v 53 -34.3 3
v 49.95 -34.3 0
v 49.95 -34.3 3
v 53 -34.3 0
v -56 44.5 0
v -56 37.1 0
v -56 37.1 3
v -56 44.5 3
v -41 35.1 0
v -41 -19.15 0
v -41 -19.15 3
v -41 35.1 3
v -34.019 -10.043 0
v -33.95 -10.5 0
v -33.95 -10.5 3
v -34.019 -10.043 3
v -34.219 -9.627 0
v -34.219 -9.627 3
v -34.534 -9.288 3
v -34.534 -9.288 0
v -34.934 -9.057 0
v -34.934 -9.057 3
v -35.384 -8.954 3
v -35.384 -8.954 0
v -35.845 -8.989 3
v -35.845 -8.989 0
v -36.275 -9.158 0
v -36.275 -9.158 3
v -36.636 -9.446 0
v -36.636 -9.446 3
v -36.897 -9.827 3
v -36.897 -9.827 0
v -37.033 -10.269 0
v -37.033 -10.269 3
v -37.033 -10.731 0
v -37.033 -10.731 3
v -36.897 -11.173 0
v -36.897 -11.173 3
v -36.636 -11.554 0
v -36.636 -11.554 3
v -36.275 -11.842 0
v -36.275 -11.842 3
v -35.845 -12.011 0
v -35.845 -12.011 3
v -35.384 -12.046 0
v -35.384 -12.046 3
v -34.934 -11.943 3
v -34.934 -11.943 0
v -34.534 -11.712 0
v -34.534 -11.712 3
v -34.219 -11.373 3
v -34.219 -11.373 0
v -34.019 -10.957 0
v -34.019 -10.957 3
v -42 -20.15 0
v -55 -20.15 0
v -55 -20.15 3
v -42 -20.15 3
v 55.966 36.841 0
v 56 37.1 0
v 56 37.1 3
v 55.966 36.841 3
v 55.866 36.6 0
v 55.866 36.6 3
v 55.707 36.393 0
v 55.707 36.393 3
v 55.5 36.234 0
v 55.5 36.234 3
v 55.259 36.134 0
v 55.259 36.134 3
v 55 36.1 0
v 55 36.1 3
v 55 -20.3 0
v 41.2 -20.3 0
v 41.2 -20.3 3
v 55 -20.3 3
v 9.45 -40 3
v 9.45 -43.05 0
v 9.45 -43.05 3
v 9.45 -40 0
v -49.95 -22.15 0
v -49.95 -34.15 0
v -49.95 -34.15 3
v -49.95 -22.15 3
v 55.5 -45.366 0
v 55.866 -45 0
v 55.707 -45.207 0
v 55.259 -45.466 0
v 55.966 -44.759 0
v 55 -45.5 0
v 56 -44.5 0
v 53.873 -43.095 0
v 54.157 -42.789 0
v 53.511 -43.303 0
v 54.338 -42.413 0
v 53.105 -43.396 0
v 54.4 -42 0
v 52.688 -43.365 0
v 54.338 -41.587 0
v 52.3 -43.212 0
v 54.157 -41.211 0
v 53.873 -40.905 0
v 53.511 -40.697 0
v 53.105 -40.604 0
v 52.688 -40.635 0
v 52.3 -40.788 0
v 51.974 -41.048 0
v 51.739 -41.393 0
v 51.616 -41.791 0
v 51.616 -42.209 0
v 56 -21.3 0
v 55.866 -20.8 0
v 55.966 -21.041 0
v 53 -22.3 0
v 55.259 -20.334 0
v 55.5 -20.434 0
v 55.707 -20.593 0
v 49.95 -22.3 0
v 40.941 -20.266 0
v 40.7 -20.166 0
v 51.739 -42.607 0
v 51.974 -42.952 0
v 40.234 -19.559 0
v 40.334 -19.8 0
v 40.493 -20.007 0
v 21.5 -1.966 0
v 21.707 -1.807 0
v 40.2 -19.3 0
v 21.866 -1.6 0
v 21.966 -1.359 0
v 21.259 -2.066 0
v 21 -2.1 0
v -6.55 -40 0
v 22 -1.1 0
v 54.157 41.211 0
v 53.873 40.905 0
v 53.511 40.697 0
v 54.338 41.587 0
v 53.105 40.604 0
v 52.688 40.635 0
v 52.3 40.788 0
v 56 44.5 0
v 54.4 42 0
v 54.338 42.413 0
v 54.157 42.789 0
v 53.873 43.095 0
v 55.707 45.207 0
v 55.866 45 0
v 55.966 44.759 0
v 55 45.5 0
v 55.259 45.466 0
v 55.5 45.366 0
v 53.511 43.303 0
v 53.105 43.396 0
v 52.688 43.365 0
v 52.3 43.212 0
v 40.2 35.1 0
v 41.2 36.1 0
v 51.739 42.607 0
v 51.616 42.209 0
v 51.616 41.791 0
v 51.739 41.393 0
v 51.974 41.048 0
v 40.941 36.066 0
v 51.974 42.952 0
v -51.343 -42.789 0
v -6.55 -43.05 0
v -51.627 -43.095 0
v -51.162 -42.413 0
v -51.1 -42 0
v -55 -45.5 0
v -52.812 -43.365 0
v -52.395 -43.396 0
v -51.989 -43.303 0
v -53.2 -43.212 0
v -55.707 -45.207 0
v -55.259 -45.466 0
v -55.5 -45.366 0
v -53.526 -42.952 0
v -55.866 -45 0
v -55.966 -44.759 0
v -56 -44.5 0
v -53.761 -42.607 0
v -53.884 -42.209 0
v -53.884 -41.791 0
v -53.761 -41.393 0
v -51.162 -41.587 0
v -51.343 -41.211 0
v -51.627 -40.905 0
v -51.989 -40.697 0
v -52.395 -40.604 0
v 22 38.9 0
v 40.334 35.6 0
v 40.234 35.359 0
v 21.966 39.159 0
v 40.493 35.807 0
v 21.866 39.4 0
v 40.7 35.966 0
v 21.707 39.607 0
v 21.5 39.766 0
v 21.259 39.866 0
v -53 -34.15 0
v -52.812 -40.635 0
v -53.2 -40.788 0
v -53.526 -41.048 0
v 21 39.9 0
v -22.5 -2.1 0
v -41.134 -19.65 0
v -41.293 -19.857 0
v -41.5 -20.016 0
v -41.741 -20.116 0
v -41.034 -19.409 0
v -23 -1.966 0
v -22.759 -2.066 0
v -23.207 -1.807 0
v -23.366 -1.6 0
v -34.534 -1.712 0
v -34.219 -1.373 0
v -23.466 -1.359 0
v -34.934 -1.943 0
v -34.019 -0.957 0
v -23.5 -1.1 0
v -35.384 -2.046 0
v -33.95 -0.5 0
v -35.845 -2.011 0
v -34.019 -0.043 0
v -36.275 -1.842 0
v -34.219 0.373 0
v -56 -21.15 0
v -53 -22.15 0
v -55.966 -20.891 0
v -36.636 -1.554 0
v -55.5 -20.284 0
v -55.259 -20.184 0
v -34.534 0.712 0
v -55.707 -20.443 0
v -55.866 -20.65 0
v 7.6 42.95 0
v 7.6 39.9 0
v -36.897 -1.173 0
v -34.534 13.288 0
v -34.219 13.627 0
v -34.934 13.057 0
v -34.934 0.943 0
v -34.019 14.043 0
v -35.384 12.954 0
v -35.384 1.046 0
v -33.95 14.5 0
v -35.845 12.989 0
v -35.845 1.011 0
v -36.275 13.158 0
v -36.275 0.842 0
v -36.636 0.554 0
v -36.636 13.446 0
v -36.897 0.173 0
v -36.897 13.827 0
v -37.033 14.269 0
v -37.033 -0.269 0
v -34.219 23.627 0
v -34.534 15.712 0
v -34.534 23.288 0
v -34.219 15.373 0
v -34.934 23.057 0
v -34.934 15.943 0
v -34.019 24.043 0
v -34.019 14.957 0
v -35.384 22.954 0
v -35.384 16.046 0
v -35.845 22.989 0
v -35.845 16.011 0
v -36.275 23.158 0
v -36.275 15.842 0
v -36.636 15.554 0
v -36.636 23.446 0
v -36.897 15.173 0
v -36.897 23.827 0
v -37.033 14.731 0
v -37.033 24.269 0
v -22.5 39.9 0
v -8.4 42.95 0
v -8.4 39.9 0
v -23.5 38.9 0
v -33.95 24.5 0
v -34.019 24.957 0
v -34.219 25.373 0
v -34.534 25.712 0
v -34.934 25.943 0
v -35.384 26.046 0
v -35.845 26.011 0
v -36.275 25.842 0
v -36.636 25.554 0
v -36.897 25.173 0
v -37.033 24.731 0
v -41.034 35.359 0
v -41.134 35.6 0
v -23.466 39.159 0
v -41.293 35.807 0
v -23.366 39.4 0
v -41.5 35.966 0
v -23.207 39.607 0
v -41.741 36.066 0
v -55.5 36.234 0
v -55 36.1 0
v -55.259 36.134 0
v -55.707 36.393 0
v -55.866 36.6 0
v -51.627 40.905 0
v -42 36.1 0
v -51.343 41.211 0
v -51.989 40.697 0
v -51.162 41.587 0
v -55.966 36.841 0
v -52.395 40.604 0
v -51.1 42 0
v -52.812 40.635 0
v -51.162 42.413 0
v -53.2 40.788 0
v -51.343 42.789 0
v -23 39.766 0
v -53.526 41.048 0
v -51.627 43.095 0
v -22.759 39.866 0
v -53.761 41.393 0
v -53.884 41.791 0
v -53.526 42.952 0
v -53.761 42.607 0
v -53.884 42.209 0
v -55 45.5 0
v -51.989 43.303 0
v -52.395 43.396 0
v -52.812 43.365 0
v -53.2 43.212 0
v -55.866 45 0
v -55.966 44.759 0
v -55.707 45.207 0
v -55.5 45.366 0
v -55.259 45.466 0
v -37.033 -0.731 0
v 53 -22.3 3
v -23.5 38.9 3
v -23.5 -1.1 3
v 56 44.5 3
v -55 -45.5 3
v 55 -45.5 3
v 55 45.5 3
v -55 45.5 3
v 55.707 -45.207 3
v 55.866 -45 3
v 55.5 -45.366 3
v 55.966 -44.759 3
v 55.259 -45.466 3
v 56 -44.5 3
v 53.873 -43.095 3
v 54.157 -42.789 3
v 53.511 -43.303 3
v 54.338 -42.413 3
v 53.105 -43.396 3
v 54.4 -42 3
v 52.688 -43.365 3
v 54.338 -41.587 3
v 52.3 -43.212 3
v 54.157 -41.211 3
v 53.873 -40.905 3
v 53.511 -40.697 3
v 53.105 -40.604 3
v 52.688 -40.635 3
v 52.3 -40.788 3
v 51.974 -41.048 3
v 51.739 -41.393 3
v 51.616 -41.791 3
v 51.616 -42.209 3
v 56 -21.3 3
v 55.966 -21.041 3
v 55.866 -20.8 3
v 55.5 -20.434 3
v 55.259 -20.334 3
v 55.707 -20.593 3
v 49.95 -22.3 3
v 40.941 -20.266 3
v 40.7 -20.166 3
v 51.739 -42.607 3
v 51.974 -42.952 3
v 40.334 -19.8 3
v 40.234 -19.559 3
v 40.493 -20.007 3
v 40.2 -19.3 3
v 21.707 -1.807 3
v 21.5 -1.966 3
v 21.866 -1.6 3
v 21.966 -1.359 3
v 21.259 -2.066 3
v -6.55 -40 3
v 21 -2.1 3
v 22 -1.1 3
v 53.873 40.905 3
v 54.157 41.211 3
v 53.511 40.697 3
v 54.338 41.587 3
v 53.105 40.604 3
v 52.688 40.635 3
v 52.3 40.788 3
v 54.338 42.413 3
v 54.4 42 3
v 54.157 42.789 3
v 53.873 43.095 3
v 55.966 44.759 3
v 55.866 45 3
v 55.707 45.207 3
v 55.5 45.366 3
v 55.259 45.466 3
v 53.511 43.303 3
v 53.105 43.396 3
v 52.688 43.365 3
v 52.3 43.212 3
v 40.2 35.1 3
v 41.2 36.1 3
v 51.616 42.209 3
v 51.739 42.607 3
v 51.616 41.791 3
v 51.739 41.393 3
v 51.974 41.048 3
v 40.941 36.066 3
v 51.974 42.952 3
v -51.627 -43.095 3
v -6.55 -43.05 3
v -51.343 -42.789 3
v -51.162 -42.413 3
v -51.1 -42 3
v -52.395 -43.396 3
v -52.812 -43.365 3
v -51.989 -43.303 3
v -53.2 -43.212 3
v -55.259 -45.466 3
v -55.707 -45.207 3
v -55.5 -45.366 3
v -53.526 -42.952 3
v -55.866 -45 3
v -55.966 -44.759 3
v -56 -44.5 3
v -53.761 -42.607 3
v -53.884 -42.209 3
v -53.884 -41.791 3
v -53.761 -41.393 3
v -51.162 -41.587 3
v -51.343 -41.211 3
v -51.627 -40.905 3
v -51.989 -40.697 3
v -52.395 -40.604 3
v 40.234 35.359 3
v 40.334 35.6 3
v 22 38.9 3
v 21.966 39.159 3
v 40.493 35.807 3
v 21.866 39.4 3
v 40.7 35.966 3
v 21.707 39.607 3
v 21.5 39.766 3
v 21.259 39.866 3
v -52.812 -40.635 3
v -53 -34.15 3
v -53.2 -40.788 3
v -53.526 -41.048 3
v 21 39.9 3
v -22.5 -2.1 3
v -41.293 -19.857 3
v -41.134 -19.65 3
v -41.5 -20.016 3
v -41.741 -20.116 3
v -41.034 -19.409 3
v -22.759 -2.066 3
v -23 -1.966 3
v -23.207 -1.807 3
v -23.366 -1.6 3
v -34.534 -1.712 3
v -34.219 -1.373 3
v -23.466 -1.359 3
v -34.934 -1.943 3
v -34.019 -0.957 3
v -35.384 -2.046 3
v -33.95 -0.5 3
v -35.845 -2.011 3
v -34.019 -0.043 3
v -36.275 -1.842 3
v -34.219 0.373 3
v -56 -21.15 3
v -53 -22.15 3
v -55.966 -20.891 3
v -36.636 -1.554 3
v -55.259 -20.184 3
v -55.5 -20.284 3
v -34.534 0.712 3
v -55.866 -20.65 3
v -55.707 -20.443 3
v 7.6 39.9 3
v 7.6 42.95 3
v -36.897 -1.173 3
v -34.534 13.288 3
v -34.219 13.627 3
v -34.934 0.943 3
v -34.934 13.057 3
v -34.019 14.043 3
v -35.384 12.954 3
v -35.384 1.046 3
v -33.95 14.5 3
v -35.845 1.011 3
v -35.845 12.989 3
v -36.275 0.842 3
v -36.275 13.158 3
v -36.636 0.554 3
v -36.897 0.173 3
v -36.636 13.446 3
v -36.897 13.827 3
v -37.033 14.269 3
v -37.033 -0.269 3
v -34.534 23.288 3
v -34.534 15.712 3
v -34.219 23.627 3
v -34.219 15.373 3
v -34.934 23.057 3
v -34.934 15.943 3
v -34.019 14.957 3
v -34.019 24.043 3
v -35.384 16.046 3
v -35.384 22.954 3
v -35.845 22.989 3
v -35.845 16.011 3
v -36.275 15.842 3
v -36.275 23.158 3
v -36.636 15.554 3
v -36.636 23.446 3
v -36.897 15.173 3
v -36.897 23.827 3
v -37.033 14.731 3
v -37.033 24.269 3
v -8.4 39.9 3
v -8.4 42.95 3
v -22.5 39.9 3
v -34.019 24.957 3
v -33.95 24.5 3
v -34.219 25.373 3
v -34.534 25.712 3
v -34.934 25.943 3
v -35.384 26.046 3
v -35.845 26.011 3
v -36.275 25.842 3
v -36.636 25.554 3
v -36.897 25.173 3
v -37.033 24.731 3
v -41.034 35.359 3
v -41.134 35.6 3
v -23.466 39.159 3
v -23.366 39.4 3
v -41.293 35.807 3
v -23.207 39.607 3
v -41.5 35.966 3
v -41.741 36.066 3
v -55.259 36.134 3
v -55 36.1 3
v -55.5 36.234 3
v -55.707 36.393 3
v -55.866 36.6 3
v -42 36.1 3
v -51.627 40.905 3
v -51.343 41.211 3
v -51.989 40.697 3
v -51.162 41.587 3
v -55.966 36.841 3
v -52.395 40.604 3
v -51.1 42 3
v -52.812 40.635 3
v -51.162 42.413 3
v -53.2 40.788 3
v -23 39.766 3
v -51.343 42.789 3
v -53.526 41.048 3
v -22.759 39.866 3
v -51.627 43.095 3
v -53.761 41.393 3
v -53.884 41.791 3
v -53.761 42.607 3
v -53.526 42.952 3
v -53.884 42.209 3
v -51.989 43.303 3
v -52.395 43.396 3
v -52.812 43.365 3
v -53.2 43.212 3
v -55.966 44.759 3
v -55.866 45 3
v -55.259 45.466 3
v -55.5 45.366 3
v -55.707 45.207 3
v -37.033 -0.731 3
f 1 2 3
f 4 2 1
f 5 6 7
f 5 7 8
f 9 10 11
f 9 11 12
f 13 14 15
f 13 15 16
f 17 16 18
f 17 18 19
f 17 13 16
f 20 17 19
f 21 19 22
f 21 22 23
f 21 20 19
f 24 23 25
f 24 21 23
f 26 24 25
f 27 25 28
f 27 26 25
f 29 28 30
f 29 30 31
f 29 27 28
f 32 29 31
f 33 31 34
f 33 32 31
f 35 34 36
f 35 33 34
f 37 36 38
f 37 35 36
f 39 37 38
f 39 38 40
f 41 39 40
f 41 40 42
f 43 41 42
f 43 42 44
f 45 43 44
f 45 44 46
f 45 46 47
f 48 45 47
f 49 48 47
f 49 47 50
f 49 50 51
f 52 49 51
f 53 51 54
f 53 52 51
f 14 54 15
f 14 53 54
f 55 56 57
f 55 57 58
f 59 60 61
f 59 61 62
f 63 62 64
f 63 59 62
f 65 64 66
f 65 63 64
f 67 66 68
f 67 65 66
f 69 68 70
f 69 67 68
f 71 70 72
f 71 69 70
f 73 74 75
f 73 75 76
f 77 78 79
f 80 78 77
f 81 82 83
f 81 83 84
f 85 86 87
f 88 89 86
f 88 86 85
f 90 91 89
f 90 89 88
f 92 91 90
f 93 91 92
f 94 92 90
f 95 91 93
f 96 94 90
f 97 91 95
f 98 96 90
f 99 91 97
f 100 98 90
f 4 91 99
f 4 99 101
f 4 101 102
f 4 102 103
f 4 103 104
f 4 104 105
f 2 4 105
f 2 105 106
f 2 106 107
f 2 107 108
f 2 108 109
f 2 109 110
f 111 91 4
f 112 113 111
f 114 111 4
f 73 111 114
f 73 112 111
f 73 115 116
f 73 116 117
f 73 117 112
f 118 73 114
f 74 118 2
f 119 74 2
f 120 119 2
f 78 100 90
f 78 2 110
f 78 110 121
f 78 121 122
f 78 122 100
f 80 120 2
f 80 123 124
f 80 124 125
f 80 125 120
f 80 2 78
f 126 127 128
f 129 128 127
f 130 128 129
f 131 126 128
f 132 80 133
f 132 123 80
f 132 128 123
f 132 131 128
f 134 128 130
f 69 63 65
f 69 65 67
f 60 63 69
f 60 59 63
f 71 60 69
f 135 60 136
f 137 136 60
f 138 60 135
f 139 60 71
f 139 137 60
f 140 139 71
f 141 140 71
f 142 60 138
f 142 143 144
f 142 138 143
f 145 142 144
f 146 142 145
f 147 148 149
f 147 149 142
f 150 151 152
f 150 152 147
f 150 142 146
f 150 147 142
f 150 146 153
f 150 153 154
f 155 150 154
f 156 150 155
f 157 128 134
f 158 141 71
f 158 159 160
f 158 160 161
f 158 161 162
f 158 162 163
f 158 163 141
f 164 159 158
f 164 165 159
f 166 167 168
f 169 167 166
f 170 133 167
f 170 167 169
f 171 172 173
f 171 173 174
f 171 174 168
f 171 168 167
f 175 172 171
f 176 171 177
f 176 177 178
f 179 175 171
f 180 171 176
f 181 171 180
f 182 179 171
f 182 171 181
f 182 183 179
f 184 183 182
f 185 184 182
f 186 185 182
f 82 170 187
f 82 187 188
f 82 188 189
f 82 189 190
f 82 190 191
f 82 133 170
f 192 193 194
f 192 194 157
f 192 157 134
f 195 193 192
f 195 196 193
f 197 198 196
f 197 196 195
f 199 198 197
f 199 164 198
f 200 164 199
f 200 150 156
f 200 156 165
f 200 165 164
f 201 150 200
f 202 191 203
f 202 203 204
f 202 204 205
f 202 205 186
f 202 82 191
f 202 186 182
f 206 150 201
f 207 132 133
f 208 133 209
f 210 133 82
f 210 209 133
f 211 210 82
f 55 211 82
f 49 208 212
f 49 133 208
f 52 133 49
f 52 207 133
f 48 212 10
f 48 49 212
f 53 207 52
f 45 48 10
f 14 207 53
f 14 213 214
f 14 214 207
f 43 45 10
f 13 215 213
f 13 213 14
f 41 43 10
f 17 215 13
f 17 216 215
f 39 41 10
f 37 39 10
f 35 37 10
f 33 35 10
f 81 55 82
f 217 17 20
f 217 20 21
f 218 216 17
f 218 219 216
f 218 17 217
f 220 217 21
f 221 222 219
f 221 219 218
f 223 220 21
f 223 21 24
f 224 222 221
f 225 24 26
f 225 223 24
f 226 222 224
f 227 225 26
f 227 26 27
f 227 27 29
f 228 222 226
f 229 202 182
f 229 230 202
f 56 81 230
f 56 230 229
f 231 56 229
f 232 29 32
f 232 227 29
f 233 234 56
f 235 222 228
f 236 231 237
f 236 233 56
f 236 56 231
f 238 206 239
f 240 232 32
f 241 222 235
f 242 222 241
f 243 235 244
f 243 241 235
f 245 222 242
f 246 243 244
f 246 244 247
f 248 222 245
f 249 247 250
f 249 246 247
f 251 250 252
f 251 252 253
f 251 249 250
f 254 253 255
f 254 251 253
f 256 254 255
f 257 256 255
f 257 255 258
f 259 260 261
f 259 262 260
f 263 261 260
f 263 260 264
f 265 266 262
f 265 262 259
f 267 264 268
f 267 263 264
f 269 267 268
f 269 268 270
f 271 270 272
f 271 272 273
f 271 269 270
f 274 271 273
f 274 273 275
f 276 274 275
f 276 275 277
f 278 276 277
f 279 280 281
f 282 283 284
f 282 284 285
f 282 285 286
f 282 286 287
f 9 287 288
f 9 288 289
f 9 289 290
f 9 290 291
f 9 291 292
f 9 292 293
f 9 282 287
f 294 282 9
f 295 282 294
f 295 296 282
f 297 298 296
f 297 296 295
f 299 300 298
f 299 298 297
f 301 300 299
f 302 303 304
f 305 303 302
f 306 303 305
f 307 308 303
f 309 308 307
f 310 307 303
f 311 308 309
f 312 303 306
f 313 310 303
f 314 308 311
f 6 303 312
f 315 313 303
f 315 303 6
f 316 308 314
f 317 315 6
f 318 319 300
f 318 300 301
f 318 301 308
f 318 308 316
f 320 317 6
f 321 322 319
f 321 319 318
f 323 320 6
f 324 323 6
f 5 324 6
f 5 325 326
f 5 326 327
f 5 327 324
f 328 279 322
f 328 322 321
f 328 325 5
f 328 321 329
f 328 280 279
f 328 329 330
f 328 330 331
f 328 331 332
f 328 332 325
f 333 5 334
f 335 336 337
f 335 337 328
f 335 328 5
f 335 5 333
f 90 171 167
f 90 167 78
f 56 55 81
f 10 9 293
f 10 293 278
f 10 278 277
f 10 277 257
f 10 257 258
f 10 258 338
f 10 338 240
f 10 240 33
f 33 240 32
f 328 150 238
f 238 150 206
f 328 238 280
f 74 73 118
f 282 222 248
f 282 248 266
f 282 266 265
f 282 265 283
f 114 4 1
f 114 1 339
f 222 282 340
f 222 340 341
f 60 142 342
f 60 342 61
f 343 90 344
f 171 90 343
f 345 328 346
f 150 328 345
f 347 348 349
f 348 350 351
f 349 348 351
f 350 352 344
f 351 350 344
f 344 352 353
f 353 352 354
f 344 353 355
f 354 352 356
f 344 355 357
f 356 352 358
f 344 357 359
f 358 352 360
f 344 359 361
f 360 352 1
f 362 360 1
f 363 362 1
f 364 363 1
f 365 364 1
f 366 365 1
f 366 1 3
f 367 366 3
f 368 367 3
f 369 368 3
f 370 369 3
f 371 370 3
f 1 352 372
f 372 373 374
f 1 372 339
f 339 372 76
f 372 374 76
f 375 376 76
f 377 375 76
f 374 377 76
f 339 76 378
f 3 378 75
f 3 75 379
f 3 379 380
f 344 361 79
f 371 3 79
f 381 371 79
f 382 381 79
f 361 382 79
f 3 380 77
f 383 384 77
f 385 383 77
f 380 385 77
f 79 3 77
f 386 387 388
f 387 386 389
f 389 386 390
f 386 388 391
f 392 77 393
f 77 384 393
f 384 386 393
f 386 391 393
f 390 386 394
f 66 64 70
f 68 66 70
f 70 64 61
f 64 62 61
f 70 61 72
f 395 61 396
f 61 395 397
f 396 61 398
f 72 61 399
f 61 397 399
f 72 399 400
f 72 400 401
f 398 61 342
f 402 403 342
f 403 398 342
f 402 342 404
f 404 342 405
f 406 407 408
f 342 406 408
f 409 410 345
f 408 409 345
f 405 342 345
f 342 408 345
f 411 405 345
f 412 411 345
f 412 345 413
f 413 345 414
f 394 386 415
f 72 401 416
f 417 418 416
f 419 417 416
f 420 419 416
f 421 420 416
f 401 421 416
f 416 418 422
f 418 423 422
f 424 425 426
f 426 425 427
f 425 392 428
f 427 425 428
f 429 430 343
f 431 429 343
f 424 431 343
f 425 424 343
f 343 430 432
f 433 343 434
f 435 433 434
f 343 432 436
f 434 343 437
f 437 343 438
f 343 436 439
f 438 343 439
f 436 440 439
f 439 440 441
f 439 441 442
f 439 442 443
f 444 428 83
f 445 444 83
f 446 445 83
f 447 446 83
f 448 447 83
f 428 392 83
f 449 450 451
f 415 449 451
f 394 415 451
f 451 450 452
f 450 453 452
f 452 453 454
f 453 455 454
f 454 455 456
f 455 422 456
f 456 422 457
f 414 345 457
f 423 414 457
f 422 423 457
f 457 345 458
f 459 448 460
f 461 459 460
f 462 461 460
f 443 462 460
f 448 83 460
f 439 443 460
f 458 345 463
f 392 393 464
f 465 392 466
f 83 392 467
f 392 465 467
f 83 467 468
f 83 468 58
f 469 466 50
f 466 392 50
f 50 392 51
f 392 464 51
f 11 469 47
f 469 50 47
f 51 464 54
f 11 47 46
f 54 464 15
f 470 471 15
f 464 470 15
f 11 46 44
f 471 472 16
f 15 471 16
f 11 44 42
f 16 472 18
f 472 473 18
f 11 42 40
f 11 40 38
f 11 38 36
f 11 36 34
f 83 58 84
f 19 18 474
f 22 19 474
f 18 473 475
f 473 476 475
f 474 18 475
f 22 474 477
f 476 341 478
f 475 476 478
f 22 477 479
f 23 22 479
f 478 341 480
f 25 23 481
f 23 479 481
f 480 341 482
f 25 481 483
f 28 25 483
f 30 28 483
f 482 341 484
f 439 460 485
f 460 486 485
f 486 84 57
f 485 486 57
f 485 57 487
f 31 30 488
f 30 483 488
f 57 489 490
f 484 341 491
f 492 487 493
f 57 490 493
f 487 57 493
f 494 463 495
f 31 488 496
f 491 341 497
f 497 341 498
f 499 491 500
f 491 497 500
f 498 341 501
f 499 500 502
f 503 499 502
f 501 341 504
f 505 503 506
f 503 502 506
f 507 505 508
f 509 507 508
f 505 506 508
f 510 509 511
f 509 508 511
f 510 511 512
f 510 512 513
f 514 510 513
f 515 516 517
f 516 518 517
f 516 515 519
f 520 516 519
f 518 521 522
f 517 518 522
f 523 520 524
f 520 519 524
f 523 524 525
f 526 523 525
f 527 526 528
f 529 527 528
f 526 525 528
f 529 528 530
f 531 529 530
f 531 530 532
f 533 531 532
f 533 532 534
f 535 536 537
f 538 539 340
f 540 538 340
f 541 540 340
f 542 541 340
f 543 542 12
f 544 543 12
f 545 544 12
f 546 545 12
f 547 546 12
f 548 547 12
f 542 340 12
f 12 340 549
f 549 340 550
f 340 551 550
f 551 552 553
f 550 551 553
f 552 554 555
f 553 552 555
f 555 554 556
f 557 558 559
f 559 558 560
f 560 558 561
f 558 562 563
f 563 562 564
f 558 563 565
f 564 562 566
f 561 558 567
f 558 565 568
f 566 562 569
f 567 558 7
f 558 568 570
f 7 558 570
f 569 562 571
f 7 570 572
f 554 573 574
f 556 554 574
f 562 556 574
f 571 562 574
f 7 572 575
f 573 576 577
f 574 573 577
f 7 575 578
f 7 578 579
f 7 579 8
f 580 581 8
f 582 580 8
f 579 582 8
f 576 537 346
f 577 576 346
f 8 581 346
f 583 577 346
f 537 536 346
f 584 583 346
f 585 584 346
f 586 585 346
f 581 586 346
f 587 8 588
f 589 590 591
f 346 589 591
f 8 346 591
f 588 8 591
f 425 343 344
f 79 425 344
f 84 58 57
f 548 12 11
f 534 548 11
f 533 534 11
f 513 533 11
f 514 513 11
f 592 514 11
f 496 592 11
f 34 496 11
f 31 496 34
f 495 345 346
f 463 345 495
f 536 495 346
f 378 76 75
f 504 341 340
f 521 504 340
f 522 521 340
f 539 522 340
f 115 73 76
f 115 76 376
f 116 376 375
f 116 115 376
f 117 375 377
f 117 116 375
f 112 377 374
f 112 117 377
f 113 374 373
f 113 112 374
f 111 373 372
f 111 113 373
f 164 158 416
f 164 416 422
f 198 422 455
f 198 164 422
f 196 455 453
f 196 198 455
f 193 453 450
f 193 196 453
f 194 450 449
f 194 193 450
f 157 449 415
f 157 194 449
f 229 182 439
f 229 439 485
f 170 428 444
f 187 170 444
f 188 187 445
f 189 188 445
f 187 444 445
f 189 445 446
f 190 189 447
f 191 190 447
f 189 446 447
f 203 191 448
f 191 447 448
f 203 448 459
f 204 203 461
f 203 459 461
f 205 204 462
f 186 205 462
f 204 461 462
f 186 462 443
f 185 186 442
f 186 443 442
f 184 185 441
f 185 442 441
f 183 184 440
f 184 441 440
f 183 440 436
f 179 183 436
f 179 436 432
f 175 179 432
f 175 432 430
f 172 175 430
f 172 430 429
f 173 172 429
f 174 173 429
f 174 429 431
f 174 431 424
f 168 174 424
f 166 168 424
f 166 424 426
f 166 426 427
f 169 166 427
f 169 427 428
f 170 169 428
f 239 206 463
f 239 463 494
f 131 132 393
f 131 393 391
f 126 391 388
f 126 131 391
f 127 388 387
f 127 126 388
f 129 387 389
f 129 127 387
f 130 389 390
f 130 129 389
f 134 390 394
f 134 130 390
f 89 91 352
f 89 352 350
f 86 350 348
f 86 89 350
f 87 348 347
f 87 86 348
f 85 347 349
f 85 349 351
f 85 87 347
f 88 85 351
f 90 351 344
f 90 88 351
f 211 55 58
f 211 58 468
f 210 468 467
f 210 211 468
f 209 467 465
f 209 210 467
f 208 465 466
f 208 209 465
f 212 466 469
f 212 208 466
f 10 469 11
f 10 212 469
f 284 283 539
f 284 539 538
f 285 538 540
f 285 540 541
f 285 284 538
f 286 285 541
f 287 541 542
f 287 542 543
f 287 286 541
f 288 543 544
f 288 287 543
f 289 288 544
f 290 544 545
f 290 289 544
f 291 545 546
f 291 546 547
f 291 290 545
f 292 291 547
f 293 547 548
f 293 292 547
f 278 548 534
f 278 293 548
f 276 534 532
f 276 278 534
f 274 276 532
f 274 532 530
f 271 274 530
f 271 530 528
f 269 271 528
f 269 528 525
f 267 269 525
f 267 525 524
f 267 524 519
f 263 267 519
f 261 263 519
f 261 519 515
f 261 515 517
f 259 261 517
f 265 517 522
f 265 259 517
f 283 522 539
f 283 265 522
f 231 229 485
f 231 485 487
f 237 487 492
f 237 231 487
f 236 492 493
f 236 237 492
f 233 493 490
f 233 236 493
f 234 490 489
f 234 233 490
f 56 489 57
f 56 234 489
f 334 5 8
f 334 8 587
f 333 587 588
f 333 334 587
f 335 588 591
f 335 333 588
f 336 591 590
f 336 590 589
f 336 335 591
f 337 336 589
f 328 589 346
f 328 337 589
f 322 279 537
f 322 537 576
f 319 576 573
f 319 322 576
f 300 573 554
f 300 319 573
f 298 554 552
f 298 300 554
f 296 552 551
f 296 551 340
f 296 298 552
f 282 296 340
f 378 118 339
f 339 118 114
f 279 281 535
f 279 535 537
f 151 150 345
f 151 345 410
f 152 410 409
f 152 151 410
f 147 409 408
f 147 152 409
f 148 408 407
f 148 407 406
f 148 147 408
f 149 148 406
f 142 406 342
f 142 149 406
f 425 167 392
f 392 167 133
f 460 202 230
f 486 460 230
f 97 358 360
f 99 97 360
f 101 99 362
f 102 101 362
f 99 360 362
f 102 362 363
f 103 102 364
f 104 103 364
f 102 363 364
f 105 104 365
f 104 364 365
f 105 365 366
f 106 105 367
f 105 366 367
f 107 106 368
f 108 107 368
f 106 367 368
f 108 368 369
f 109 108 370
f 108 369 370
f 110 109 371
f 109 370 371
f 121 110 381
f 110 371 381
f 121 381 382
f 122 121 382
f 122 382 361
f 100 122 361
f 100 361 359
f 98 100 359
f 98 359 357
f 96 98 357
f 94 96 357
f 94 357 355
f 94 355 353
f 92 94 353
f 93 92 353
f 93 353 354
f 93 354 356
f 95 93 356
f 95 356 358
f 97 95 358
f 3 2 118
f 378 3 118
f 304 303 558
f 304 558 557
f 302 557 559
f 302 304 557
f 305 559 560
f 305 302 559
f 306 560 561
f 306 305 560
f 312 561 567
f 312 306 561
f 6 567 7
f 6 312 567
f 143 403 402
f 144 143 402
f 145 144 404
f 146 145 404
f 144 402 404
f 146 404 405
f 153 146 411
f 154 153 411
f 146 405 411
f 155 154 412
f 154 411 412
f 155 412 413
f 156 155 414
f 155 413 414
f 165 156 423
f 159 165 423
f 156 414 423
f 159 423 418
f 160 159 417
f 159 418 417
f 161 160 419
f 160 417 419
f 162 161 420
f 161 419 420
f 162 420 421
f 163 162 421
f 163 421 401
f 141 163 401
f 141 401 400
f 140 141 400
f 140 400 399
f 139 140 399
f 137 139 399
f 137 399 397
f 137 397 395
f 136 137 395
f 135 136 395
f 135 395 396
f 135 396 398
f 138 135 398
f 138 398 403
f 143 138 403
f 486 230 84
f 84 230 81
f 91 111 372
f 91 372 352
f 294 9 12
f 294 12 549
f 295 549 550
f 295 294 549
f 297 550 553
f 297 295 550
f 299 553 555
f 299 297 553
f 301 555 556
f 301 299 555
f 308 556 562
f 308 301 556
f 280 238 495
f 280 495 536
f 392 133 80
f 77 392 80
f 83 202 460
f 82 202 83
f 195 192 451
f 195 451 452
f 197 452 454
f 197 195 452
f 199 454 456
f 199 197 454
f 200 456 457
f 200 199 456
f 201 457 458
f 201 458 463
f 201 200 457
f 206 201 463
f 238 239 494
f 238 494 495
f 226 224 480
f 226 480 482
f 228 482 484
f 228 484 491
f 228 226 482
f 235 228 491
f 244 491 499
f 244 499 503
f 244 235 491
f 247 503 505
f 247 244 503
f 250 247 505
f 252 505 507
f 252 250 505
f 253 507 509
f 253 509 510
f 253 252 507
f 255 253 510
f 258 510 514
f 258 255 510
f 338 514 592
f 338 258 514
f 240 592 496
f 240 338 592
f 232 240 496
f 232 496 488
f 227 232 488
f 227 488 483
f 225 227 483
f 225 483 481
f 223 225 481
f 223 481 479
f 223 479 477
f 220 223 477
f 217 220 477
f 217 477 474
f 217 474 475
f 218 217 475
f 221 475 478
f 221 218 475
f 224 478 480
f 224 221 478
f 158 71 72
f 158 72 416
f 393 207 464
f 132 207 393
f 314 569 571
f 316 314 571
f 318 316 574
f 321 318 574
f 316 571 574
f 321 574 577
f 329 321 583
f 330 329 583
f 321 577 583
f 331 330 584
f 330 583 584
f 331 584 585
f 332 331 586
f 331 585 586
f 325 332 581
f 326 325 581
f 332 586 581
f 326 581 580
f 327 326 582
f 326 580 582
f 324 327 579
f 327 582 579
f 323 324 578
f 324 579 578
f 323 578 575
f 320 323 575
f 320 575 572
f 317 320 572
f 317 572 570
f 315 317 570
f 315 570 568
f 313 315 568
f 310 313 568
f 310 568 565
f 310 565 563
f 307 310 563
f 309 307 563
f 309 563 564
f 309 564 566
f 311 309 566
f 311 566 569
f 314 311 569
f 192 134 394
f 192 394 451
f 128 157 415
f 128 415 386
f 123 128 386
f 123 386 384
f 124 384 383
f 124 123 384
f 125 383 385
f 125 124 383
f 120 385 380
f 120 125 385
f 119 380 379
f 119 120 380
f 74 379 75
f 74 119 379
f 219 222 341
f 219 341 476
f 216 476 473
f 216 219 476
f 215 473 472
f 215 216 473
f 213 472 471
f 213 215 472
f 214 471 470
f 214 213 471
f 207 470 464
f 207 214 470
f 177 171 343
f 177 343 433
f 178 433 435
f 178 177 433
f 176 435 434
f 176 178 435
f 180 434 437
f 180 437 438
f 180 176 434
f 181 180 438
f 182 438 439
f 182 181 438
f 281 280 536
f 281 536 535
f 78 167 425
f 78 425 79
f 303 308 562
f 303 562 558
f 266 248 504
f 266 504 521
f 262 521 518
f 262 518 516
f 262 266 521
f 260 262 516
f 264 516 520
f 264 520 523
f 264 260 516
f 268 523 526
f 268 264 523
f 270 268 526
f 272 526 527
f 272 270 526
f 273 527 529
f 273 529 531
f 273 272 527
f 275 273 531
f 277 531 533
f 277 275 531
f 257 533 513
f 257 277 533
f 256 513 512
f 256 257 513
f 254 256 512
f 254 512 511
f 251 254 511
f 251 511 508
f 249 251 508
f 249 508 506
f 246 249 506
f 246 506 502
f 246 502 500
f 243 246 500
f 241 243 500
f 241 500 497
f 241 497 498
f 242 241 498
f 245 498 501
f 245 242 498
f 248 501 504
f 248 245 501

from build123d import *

# Parameters (mm, degrees)
CROQUIS1_R              = 1.55
CROQUIS1_W              = 16
CROQUIS1_H              = 3.05
CROQUIS1_W_2            = 3.05
CROQUIS1_H_2            = 12
SALIENTE_EXTRUIR1_DEPTH = 3
CROQUIS2_R              = 1.4
CORTAR_EXTRUIR2_DEPTH   = 4


with BuildPart() as part:
    # Croquis1 → Saliente-Extruir1 (new body)
    with BuildSketch(Plane.XY):
        with BuildLine():
            Line((56, -21.3), (56, -44.5))
            ThreePointArc((56, -44.5), (55.707106781, -45.207106781), (55, -45.5))
            Line((55, -45.5), (-55, -45.5))
            ThreePointArc((-55, -45.5), (-55.707106781, -45.207106781), (-56, -44.5))
            Line((-56, -44.5), (-56, -21.15))
            ThreePointArc((-56, -21.15), (-55.707106781, -20.442893219), (-55, -20.15))
            Line((-55, -20.15), (-42, -20.15))
            ThreePointArc((-42, -20.15), (-41.292893219, -19.857106781), (-41, -19.15))
            Line((-41, -19.15), (-41, 35.1))
            ThreePointArc((-41, 35.1), (-41.292893219, 35.807106781), (-42, 36.1))
            Line((-42, 36.1), (-55, 36.1))
            ThreePointArc((-55, 36.1), (-55.707106781, 36.392893219), (-56, 37.1))
            Line((-56, 37.1), (-56, 44.5))
            ThreePointArc((-56, 44.5), (-55.707106781, 45.207106781), (-55, 45.5))
            Line((-55, 45.5), (55, 45.5))
            ThreePointArc((55, 45.5), (55.707106781, 45.207106781), (56, 44.5))
            Line((56, 44.5), (56, 37.1))
            ThreePointArc((56, 37.1), (55.707106781, 36.392893219), (55, 36.1))
            Line((55, 36.1), (41.2, 36.1))
            ThreePointArc((41.2, 36.1), (40.492893219, 35.807106781), (40.2, 35.1))
            Line((40.2, 35.1), (40.2, -19.3))
            ThreePointArc((40.2, -19.3), (40.492893219, -20.007106781), (41.2, -20.3))
            Line((41.2, -20.3), (55, -20.3))
            ThreePointArc((55, -20.3), (55.707106781, -20.592893219), (56, -21.3))
        make_face()
        with Locations((-35.5, 24.5)):
            Circle(CROQUIS1_R, mode=Mode.SUBTRACT)
        with Locations((-35.5, 14.5)):
            Circle(CROQUIS1_R, mode=Mode.SUBTRACT)
        with Locations((-35.5, -0.5)):
            Circle(CROQUIS1_R, mode=Mode.SUBTRACT)
        with Locations((-35.5, -10.5)):
            Circle(CROQUIS1_R, mode=Mode.SUBTRACT)
        with BuildLine():
            Line((-8.4, 39.9), (-22.5, 39.9))
            ThreePointArc((-22.5, 39.9), (-23.207106781, 39.607106781), (-23.5, 38.9))
            Line((-23.5, 38.9), (-23.5, -1.1))
            ThreePointArc((-23.5, -1.1), (-23.207106781, -1.807106781), (-22.5, -2.1))
            Line((-22.5, -2.1), (21, -2.1))
            ThreePointArc((21, -2.1), (21.707106781, -1.807106781), (22, -1.1))
            Line((22, -1.1), (22, 38.9))
            ThreePointArc((22, 38.9), (21.707106781, 39.607106781), (21, 39.9))
            Line((21, 39.9), (7.6, 39.9))
            Line((7.6, 39.9), (7.6, 42.95))
            Line((7.6, 42.95), (-8.4, 42.95))
            Line((-8.4, 42.95), (-8.4, 39.9))
        make_face(mode=Mode.SUBTRACT)
        with Locations((1.45, -41.525)):
            Rectangle(CROQUIS1_W, CROQUIS1_H, mode=Mode.SUBTRACT)
        with Locations((51.475, -28.3)):
            Rectangle(CROQUIS1_W_2, CROQUIS1_H_2, mode=Mode.SUBTRACT)
        with Locations((-51.475, -28.15)):
            Rectangle(CROQUIS1_W_2, CROQUIS1_H_2, mode=Mode.SUBTRACT)
    extrude(amount=SALIENTE_EXTRUIR1_DEPTH)

    # Croquis2 → Cortar-Extruir2 (cut, through all)
    with BuildSketch(Plane.XY.offset(3)):
        with Locations((53, 42)):
            Circle(CROQUIS2_R)
        with Locations((-52.5, 42)):
            Circle(CROQUIS2_R)
        with Locations((-52.5, -42)):
            Circle(CROQUIS2_R)
        with Locations((53, -42)):
            Circle(CROQUIS2_R)
    extrude(amount=-CORTAR_EXTRUIR2_DEPTH, mode=Mode.SUBTRACT)


solid = part.part
